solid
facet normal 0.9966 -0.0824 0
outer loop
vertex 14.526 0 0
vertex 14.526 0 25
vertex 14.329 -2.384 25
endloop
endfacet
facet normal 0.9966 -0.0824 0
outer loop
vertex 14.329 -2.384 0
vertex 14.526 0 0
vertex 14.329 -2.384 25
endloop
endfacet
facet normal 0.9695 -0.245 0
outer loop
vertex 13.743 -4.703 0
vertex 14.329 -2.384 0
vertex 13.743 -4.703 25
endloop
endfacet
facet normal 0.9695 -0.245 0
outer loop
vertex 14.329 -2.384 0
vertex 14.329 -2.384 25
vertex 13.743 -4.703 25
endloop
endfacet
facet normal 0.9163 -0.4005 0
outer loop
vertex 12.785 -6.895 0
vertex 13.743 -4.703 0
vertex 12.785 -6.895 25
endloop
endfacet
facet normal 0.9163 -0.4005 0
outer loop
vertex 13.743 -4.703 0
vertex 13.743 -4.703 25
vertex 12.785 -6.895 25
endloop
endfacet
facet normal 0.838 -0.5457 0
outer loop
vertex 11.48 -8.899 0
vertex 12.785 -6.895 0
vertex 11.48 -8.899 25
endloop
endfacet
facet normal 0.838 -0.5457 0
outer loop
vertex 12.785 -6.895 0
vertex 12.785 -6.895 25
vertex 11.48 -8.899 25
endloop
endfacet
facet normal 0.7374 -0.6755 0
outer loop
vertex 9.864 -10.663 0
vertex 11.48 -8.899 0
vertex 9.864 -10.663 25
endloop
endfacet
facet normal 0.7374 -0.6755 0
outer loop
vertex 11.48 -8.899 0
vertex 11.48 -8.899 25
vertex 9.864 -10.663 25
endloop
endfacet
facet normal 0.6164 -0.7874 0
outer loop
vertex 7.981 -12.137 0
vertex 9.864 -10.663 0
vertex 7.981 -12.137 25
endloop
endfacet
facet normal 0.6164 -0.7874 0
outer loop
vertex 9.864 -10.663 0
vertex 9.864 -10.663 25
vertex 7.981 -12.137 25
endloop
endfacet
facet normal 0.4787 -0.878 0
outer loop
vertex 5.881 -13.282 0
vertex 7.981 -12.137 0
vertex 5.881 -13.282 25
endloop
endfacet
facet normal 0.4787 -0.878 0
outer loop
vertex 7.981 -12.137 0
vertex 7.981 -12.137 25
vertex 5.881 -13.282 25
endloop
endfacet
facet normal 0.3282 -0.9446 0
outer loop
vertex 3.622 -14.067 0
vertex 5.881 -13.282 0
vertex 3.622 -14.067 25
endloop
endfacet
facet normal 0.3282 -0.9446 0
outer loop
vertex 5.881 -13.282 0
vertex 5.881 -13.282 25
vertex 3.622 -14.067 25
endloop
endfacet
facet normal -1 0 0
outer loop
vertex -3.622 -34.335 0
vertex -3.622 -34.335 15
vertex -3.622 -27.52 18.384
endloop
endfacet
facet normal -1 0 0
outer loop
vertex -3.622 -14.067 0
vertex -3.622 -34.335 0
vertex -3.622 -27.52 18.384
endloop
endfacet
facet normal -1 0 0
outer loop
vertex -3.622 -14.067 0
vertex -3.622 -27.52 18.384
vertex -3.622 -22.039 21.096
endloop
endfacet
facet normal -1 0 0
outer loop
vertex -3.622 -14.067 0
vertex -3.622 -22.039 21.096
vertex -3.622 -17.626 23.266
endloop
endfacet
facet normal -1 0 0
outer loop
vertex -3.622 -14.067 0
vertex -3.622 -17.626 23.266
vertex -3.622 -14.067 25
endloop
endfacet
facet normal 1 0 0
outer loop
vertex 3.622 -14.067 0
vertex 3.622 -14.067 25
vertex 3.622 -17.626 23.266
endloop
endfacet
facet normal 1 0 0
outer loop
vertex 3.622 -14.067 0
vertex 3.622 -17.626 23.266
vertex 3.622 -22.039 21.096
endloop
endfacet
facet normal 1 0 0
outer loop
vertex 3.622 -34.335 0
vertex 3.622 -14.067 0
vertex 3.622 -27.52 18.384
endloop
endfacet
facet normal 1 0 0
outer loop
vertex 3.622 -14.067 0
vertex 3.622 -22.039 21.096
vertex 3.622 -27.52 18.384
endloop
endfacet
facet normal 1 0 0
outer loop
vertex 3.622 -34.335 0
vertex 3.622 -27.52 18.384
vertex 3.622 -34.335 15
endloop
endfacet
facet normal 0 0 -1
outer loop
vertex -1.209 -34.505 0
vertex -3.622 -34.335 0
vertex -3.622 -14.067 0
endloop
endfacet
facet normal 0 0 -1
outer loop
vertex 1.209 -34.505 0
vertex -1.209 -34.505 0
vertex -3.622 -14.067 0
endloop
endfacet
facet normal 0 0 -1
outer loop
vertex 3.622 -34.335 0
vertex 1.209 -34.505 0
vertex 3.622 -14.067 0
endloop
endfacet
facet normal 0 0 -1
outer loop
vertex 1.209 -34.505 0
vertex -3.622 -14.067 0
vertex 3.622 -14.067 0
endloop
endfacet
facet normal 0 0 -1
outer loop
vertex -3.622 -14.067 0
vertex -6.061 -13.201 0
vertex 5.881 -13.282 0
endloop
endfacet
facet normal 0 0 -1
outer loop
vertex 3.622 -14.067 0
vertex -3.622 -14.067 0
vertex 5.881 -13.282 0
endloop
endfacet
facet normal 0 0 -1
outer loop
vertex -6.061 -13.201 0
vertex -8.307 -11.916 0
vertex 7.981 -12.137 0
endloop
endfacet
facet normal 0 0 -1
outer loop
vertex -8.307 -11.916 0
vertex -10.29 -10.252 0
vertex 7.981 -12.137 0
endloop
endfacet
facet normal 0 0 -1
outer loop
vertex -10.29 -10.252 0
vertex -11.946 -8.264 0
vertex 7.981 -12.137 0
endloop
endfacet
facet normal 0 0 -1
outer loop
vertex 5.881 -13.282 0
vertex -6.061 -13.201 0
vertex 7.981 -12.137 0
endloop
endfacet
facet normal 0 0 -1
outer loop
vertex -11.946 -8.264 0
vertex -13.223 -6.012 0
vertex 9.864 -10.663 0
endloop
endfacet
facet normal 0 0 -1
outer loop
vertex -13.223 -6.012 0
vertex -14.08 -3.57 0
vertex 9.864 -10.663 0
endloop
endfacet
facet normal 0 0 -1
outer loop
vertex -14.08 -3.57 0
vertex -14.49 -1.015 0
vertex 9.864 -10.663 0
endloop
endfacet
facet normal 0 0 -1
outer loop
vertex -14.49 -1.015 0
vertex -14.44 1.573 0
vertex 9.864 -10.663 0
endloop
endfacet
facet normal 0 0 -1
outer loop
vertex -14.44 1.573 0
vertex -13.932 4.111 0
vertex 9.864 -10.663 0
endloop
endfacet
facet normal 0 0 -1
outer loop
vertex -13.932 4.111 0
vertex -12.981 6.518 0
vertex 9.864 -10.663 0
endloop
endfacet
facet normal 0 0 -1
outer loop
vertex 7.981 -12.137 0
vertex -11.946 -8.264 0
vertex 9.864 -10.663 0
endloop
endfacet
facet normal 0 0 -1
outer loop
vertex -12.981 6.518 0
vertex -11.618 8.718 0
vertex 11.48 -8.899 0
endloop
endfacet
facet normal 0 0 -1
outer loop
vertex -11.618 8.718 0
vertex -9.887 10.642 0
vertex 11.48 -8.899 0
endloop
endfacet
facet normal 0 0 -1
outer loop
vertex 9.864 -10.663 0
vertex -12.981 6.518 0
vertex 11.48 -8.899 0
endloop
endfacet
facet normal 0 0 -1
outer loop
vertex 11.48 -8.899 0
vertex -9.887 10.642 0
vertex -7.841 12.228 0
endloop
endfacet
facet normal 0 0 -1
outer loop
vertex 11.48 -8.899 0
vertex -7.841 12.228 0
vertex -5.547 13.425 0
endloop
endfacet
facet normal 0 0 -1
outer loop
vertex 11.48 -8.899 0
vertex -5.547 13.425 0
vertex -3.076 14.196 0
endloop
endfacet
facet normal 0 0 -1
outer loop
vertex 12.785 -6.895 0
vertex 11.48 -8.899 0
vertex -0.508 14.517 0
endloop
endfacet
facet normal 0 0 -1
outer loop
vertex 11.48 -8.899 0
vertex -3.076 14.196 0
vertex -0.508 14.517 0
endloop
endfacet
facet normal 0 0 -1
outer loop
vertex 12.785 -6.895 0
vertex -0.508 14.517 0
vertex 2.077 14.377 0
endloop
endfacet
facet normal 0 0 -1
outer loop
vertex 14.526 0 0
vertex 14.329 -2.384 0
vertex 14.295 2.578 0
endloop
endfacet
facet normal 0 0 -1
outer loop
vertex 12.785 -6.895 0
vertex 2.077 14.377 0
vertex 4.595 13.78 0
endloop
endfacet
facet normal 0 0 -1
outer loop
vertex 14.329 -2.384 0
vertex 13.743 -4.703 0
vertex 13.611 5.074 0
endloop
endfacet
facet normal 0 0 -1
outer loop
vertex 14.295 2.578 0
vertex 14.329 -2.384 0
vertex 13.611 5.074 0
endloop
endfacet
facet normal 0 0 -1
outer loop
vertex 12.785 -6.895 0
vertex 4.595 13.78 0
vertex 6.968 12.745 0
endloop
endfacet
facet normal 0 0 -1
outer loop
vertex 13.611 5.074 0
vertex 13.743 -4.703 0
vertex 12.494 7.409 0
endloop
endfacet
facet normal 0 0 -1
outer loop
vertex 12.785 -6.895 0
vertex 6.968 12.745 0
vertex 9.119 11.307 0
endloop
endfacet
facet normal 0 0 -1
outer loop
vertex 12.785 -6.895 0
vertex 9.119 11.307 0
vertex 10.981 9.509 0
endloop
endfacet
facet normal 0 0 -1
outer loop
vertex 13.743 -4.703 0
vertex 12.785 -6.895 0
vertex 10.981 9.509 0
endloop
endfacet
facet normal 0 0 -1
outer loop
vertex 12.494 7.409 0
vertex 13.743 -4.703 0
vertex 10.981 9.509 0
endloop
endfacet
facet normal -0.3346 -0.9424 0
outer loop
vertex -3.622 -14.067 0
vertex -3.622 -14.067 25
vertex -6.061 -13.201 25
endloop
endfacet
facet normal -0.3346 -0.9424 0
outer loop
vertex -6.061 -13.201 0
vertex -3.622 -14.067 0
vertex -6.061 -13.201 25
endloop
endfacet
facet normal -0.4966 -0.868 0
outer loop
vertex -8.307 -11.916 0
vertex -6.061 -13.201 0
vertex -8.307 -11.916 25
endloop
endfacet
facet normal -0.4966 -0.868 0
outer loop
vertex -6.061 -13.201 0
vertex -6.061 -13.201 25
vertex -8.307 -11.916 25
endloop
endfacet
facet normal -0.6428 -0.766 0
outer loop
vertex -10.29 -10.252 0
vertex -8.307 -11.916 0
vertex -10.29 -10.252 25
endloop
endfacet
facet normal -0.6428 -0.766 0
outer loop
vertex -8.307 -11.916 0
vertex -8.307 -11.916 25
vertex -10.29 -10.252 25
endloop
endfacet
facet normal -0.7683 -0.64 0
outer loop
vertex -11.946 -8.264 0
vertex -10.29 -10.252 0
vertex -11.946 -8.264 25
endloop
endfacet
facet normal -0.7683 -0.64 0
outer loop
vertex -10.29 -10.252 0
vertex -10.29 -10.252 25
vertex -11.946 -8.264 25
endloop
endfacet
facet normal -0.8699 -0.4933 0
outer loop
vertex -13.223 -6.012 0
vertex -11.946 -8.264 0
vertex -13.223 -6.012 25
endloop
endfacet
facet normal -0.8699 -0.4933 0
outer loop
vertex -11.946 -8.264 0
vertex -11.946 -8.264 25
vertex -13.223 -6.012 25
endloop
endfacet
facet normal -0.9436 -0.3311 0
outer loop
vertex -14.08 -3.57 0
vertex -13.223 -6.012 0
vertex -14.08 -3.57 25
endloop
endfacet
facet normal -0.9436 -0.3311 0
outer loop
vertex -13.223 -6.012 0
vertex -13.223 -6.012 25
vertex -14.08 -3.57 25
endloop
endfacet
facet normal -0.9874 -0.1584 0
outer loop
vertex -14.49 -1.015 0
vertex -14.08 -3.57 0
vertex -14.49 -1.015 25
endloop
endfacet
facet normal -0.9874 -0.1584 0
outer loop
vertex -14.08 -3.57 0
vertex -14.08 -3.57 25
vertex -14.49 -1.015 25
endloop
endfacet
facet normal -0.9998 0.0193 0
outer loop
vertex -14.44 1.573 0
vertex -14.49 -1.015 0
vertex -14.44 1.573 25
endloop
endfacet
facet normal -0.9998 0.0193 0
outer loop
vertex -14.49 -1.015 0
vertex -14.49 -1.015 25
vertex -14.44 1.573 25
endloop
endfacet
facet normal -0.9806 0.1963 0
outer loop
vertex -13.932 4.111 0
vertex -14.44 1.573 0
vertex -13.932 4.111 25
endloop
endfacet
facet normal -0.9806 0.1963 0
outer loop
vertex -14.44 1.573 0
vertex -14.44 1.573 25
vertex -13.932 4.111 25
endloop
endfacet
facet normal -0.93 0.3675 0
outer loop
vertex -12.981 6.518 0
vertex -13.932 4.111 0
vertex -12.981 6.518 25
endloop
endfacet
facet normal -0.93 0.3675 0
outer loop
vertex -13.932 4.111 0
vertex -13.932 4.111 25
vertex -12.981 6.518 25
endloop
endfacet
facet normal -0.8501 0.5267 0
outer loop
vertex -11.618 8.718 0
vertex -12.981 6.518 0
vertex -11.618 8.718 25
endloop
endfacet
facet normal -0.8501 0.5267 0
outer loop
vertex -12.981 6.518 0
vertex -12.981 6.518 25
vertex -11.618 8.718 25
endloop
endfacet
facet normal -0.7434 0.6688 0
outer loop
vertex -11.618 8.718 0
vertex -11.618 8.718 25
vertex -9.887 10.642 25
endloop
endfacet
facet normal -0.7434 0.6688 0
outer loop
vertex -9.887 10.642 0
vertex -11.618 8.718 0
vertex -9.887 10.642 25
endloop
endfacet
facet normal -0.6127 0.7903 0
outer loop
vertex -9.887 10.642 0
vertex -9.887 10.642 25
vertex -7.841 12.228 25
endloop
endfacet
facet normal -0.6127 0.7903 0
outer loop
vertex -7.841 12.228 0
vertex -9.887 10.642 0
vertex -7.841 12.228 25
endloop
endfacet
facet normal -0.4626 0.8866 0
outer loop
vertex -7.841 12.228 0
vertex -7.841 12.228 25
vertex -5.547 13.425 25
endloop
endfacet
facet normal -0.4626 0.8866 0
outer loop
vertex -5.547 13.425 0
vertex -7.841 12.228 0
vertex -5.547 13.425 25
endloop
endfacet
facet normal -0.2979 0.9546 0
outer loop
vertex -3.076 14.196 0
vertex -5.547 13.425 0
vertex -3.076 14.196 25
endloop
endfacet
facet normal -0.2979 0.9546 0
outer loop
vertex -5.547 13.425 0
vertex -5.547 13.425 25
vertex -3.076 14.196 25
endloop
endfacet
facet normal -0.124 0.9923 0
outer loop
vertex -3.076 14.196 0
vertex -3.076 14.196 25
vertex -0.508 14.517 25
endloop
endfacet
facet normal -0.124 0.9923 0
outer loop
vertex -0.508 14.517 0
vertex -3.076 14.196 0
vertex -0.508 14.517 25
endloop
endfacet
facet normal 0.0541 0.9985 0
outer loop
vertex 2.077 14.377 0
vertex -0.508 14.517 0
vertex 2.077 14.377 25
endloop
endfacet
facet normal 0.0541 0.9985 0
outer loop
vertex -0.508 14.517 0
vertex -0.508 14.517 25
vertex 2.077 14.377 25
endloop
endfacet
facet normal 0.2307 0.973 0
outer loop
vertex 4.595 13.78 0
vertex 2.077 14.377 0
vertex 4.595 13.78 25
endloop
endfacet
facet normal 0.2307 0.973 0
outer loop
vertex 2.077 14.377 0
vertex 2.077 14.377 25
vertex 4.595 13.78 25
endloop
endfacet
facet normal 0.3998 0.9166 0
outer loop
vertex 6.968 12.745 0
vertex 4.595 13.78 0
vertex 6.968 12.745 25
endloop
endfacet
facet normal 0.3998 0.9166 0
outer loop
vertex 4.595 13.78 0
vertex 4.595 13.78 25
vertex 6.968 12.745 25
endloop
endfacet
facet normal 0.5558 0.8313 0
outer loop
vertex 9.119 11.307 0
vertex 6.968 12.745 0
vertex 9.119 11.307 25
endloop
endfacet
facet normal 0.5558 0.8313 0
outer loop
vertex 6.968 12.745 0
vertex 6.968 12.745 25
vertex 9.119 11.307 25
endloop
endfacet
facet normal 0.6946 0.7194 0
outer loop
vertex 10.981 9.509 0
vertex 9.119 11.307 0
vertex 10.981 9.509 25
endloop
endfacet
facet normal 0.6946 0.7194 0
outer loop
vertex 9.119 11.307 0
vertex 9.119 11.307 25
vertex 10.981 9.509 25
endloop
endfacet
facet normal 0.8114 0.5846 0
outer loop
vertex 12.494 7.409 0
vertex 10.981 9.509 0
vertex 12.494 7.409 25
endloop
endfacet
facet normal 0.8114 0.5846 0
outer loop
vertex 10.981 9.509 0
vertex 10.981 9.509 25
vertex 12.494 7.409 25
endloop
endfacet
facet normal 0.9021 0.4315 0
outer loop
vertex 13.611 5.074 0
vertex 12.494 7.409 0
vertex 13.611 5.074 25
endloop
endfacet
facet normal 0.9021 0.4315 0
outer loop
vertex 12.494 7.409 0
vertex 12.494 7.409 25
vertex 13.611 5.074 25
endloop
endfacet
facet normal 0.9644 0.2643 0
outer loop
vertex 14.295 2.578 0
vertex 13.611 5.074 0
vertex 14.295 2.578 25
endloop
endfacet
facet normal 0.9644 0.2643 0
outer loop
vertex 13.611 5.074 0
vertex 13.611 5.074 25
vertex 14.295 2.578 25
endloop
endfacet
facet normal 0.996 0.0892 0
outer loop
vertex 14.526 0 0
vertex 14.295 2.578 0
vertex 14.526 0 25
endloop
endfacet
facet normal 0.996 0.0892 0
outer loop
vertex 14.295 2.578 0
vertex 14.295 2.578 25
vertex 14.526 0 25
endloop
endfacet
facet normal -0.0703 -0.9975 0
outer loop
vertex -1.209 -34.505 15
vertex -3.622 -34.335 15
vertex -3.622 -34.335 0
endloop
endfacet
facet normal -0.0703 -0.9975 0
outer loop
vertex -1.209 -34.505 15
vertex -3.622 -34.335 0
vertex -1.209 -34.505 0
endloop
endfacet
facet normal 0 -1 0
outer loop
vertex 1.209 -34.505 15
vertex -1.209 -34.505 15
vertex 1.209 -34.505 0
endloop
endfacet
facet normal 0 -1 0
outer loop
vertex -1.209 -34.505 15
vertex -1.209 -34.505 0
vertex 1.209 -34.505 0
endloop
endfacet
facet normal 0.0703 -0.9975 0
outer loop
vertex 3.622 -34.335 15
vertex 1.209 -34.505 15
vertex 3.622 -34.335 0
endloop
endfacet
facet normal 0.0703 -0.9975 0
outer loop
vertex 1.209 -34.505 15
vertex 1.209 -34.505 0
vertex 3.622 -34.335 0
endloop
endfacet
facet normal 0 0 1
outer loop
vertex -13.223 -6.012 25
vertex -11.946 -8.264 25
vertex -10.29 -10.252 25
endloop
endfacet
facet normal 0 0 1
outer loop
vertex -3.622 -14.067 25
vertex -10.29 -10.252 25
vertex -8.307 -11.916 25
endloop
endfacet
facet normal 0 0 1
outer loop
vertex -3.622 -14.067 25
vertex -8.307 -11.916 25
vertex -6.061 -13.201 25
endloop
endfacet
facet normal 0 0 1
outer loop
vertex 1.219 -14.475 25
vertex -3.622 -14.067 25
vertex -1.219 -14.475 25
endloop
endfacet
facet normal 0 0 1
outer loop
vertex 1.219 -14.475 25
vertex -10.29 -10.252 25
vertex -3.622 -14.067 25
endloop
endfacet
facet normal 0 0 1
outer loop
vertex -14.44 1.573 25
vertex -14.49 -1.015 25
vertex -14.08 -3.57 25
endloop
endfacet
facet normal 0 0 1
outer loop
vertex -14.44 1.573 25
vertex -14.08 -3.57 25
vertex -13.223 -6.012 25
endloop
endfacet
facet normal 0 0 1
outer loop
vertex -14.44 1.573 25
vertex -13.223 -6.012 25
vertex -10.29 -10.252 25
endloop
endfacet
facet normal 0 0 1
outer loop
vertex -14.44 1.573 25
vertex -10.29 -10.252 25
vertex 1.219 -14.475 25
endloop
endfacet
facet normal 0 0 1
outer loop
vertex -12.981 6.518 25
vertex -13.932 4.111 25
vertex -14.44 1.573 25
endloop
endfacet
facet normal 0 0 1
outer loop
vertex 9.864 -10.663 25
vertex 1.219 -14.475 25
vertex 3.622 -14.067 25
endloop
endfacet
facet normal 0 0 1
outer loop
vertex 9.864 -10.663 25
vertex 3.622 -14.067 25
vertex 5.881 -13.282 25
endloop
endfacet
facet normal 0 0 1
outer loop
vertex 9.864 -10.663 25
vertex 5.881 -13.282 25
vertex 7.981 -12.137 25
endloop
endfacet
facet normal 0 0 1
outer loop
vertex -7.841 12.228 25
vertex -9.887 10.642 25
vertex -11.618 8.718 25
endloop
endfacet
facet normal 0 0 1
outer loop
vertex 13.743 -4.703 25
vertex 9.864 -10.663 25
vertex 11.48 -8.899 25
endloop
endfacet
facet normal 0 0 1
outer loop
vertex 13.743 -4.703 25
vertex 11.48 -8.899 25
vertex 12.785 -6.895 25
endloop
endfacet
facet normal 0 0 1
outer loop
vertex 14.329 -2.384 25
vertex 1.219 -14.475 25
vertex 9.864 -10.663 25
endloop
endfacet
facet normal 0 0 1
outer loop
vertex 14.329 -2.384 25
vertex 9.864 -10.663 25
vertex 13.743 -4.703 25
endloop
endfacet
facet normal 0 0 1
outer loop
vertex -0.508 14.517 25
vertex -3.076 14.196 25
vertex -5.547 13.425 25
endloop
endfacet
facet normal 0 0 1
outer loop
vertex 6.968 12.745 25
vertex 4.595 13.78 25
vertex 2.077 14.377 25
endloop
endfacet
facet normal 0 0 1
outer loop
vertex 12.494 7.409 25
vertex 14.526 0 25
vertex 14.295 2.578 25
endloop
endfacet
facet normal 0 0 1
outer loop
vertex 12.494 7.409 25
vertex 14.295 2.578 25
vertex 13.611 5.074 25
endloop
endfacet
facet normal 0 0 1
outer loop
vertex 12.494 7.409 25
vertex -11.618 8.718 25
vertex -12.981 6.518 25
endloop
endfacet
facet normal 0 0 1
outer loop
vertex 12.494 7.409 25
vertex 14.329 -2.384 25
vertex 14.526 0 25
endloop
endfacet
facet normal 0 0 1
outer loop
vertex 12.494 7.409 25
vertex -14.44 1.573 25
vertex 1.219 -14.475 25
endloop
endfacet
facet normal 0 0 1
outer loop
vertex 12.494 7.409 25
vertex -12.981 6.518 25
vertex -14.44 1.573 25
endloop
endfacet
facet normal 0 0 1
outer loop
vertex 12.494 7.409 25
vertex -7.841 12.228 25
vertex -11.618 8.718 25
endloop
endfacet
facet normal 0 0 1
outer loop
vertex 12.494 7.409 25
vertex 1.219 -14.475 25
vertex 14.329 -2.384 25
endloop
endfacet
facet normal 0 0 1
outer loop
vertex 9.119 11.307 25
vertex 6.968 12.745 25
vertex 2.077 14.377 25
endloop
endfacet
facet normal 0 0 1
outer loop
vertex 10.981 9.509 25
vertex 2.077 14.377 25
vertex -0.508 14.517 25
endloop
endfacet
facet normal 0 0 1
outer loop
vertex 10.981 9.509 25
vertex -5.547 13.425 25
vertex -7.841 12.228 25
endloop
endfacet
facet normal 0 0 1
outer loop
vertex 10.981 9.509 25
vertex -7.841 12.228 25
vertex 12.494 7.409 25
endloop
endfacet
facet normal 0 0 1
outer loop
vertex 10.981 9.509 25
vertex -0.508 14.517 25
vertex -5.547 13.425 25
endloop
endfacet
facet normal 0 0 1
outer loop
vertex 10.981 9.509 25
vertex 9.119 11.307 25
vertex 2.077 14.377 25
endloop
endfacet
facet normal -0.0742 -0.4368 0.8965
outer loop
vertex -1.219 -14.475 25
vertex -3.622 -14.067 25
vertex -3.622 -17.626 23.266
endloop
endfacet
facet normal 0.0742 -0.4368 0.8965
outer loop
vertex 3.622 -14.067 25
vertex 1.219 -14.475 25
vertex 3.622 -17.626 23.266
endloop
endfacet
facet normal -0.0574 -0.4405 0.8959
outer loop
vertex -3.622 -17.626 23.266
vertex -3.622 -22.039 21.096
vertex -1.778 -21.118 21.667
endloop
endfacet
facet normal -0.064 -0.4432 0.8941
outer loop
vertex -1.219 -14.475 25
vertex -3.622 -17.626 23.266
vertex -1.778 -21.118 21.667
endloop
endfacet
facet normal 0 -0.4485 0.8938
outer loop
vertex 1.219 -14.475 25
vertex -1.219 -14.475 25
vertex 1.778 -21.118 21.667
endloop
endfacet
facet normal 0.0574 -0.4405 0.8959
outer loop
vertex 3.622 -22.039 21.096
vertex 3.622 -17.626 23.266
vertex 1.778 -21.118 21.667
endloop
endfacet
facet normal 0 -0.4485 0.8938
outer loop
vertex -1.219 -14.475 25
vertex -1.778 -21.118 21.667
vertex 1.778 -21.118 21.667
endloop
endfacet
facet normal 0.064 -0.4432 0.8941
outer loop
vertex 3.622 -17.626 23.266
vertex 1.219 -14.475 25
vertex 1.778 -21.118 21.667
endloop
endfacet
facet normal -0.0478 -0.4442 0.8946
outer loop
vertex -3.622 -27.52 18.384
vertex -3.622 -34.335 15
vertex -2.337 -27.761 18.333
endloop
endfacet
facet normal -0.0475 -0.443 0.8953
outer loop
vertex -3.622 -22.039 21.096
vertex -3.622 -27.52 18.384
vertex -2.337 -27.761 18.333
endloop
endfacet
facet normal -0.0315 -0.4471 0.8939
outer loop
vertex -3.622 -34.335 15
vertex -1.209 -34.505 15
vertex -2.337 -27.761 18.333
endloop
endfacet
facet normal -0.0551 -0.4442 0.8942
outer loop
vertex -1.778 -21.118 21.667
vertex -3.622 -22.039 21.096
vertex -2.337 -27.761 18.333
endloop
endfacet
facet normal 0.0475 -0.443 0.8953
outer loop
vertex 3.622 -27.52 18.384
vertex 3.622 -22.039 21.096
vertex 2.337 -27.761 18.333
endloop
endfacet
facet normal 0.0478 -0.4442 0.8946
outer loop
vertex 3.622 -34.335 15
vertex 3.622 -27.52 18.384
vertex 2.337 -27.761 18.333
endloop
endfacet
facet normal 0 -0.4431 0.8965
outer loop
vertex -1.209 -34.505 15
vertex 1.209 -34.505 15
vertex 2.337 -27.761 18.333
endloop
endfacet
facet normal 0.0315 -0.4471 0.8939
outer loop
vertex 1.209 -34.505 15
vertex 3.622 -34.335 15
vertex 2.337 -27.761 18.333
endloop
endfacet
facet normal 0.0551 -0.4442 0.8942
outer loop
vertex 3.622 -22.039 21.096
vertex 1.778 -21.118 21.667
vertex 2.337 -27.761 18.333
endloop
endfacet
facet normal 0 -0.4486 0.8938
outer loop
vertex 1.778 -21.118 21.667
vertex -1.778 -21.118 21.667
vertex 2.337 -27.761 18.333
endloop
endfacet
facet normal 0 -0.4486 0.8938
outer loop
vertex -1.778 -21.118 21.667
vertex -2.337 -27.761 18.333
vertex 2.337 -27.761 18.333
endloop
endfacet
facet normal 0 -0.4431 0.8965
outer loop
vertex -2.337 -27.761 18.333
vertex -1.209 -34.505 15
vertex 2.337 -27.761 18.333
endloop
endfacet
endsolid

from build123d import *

# Parameters (mm, degrees)
F0_R     = 34.5257671678
F1_DEPTH = 25
F2_SIZE2 = 10
F2_SIZE  = 20
F4_DEPTH = 25


with BuildPart() as f1:
    # F0 (on Top) → F1 (new body)
    with BuildSketch(Plane.XY):
        Circle(F0_R)
    extrude(amount=F1_DEPTH)

    # F2
    f2_edges = [f1.edges().sort_by_distance(p)[0] for p in [
        (-34.525767, 0, 25),
    ]]
    f2_side = f1.faces().sort_by_distance((0, 0, 25))[0]
    chamfer(f2_edges, length=F2_SIZE, length2=F2_SIZE2, reference=f2_side)

    # F3 (on face) → F4 (cut)
    with BuildSketch(Plane.XY.offset(25)):
        with BuildLine():
            Line((-3.6215493205, -34.3353022273), (-3.6215493205, -14.0670640978))
            ThreePointArc((-3.6215493205, -14.0670640978), (-8.899217089, 11.4804985525), (14.5257671678, 0))
            ThreePointArc((14.5257671678, 0), (11.4804985525, -8.899217089), (3.6215493205, -14.0670640978))
            Line((3.6215493205, -14.0670640978), (3.6215493205, -34.3353022273))
            ThreePointArc((3.6215493205, -34.3353022273), (25.6618916601, -23.0975304946), (34.5257671678, 0))
            ThreePointArc((34.5257671678, 0), (-23.0975304946, 25.6618916601), (-3.6215493205, -34.3353022273))
        make_face()
    extrude(amount=-F4_DEPTH, mode=Mode.SUBTRACT)


solid = f1.part
